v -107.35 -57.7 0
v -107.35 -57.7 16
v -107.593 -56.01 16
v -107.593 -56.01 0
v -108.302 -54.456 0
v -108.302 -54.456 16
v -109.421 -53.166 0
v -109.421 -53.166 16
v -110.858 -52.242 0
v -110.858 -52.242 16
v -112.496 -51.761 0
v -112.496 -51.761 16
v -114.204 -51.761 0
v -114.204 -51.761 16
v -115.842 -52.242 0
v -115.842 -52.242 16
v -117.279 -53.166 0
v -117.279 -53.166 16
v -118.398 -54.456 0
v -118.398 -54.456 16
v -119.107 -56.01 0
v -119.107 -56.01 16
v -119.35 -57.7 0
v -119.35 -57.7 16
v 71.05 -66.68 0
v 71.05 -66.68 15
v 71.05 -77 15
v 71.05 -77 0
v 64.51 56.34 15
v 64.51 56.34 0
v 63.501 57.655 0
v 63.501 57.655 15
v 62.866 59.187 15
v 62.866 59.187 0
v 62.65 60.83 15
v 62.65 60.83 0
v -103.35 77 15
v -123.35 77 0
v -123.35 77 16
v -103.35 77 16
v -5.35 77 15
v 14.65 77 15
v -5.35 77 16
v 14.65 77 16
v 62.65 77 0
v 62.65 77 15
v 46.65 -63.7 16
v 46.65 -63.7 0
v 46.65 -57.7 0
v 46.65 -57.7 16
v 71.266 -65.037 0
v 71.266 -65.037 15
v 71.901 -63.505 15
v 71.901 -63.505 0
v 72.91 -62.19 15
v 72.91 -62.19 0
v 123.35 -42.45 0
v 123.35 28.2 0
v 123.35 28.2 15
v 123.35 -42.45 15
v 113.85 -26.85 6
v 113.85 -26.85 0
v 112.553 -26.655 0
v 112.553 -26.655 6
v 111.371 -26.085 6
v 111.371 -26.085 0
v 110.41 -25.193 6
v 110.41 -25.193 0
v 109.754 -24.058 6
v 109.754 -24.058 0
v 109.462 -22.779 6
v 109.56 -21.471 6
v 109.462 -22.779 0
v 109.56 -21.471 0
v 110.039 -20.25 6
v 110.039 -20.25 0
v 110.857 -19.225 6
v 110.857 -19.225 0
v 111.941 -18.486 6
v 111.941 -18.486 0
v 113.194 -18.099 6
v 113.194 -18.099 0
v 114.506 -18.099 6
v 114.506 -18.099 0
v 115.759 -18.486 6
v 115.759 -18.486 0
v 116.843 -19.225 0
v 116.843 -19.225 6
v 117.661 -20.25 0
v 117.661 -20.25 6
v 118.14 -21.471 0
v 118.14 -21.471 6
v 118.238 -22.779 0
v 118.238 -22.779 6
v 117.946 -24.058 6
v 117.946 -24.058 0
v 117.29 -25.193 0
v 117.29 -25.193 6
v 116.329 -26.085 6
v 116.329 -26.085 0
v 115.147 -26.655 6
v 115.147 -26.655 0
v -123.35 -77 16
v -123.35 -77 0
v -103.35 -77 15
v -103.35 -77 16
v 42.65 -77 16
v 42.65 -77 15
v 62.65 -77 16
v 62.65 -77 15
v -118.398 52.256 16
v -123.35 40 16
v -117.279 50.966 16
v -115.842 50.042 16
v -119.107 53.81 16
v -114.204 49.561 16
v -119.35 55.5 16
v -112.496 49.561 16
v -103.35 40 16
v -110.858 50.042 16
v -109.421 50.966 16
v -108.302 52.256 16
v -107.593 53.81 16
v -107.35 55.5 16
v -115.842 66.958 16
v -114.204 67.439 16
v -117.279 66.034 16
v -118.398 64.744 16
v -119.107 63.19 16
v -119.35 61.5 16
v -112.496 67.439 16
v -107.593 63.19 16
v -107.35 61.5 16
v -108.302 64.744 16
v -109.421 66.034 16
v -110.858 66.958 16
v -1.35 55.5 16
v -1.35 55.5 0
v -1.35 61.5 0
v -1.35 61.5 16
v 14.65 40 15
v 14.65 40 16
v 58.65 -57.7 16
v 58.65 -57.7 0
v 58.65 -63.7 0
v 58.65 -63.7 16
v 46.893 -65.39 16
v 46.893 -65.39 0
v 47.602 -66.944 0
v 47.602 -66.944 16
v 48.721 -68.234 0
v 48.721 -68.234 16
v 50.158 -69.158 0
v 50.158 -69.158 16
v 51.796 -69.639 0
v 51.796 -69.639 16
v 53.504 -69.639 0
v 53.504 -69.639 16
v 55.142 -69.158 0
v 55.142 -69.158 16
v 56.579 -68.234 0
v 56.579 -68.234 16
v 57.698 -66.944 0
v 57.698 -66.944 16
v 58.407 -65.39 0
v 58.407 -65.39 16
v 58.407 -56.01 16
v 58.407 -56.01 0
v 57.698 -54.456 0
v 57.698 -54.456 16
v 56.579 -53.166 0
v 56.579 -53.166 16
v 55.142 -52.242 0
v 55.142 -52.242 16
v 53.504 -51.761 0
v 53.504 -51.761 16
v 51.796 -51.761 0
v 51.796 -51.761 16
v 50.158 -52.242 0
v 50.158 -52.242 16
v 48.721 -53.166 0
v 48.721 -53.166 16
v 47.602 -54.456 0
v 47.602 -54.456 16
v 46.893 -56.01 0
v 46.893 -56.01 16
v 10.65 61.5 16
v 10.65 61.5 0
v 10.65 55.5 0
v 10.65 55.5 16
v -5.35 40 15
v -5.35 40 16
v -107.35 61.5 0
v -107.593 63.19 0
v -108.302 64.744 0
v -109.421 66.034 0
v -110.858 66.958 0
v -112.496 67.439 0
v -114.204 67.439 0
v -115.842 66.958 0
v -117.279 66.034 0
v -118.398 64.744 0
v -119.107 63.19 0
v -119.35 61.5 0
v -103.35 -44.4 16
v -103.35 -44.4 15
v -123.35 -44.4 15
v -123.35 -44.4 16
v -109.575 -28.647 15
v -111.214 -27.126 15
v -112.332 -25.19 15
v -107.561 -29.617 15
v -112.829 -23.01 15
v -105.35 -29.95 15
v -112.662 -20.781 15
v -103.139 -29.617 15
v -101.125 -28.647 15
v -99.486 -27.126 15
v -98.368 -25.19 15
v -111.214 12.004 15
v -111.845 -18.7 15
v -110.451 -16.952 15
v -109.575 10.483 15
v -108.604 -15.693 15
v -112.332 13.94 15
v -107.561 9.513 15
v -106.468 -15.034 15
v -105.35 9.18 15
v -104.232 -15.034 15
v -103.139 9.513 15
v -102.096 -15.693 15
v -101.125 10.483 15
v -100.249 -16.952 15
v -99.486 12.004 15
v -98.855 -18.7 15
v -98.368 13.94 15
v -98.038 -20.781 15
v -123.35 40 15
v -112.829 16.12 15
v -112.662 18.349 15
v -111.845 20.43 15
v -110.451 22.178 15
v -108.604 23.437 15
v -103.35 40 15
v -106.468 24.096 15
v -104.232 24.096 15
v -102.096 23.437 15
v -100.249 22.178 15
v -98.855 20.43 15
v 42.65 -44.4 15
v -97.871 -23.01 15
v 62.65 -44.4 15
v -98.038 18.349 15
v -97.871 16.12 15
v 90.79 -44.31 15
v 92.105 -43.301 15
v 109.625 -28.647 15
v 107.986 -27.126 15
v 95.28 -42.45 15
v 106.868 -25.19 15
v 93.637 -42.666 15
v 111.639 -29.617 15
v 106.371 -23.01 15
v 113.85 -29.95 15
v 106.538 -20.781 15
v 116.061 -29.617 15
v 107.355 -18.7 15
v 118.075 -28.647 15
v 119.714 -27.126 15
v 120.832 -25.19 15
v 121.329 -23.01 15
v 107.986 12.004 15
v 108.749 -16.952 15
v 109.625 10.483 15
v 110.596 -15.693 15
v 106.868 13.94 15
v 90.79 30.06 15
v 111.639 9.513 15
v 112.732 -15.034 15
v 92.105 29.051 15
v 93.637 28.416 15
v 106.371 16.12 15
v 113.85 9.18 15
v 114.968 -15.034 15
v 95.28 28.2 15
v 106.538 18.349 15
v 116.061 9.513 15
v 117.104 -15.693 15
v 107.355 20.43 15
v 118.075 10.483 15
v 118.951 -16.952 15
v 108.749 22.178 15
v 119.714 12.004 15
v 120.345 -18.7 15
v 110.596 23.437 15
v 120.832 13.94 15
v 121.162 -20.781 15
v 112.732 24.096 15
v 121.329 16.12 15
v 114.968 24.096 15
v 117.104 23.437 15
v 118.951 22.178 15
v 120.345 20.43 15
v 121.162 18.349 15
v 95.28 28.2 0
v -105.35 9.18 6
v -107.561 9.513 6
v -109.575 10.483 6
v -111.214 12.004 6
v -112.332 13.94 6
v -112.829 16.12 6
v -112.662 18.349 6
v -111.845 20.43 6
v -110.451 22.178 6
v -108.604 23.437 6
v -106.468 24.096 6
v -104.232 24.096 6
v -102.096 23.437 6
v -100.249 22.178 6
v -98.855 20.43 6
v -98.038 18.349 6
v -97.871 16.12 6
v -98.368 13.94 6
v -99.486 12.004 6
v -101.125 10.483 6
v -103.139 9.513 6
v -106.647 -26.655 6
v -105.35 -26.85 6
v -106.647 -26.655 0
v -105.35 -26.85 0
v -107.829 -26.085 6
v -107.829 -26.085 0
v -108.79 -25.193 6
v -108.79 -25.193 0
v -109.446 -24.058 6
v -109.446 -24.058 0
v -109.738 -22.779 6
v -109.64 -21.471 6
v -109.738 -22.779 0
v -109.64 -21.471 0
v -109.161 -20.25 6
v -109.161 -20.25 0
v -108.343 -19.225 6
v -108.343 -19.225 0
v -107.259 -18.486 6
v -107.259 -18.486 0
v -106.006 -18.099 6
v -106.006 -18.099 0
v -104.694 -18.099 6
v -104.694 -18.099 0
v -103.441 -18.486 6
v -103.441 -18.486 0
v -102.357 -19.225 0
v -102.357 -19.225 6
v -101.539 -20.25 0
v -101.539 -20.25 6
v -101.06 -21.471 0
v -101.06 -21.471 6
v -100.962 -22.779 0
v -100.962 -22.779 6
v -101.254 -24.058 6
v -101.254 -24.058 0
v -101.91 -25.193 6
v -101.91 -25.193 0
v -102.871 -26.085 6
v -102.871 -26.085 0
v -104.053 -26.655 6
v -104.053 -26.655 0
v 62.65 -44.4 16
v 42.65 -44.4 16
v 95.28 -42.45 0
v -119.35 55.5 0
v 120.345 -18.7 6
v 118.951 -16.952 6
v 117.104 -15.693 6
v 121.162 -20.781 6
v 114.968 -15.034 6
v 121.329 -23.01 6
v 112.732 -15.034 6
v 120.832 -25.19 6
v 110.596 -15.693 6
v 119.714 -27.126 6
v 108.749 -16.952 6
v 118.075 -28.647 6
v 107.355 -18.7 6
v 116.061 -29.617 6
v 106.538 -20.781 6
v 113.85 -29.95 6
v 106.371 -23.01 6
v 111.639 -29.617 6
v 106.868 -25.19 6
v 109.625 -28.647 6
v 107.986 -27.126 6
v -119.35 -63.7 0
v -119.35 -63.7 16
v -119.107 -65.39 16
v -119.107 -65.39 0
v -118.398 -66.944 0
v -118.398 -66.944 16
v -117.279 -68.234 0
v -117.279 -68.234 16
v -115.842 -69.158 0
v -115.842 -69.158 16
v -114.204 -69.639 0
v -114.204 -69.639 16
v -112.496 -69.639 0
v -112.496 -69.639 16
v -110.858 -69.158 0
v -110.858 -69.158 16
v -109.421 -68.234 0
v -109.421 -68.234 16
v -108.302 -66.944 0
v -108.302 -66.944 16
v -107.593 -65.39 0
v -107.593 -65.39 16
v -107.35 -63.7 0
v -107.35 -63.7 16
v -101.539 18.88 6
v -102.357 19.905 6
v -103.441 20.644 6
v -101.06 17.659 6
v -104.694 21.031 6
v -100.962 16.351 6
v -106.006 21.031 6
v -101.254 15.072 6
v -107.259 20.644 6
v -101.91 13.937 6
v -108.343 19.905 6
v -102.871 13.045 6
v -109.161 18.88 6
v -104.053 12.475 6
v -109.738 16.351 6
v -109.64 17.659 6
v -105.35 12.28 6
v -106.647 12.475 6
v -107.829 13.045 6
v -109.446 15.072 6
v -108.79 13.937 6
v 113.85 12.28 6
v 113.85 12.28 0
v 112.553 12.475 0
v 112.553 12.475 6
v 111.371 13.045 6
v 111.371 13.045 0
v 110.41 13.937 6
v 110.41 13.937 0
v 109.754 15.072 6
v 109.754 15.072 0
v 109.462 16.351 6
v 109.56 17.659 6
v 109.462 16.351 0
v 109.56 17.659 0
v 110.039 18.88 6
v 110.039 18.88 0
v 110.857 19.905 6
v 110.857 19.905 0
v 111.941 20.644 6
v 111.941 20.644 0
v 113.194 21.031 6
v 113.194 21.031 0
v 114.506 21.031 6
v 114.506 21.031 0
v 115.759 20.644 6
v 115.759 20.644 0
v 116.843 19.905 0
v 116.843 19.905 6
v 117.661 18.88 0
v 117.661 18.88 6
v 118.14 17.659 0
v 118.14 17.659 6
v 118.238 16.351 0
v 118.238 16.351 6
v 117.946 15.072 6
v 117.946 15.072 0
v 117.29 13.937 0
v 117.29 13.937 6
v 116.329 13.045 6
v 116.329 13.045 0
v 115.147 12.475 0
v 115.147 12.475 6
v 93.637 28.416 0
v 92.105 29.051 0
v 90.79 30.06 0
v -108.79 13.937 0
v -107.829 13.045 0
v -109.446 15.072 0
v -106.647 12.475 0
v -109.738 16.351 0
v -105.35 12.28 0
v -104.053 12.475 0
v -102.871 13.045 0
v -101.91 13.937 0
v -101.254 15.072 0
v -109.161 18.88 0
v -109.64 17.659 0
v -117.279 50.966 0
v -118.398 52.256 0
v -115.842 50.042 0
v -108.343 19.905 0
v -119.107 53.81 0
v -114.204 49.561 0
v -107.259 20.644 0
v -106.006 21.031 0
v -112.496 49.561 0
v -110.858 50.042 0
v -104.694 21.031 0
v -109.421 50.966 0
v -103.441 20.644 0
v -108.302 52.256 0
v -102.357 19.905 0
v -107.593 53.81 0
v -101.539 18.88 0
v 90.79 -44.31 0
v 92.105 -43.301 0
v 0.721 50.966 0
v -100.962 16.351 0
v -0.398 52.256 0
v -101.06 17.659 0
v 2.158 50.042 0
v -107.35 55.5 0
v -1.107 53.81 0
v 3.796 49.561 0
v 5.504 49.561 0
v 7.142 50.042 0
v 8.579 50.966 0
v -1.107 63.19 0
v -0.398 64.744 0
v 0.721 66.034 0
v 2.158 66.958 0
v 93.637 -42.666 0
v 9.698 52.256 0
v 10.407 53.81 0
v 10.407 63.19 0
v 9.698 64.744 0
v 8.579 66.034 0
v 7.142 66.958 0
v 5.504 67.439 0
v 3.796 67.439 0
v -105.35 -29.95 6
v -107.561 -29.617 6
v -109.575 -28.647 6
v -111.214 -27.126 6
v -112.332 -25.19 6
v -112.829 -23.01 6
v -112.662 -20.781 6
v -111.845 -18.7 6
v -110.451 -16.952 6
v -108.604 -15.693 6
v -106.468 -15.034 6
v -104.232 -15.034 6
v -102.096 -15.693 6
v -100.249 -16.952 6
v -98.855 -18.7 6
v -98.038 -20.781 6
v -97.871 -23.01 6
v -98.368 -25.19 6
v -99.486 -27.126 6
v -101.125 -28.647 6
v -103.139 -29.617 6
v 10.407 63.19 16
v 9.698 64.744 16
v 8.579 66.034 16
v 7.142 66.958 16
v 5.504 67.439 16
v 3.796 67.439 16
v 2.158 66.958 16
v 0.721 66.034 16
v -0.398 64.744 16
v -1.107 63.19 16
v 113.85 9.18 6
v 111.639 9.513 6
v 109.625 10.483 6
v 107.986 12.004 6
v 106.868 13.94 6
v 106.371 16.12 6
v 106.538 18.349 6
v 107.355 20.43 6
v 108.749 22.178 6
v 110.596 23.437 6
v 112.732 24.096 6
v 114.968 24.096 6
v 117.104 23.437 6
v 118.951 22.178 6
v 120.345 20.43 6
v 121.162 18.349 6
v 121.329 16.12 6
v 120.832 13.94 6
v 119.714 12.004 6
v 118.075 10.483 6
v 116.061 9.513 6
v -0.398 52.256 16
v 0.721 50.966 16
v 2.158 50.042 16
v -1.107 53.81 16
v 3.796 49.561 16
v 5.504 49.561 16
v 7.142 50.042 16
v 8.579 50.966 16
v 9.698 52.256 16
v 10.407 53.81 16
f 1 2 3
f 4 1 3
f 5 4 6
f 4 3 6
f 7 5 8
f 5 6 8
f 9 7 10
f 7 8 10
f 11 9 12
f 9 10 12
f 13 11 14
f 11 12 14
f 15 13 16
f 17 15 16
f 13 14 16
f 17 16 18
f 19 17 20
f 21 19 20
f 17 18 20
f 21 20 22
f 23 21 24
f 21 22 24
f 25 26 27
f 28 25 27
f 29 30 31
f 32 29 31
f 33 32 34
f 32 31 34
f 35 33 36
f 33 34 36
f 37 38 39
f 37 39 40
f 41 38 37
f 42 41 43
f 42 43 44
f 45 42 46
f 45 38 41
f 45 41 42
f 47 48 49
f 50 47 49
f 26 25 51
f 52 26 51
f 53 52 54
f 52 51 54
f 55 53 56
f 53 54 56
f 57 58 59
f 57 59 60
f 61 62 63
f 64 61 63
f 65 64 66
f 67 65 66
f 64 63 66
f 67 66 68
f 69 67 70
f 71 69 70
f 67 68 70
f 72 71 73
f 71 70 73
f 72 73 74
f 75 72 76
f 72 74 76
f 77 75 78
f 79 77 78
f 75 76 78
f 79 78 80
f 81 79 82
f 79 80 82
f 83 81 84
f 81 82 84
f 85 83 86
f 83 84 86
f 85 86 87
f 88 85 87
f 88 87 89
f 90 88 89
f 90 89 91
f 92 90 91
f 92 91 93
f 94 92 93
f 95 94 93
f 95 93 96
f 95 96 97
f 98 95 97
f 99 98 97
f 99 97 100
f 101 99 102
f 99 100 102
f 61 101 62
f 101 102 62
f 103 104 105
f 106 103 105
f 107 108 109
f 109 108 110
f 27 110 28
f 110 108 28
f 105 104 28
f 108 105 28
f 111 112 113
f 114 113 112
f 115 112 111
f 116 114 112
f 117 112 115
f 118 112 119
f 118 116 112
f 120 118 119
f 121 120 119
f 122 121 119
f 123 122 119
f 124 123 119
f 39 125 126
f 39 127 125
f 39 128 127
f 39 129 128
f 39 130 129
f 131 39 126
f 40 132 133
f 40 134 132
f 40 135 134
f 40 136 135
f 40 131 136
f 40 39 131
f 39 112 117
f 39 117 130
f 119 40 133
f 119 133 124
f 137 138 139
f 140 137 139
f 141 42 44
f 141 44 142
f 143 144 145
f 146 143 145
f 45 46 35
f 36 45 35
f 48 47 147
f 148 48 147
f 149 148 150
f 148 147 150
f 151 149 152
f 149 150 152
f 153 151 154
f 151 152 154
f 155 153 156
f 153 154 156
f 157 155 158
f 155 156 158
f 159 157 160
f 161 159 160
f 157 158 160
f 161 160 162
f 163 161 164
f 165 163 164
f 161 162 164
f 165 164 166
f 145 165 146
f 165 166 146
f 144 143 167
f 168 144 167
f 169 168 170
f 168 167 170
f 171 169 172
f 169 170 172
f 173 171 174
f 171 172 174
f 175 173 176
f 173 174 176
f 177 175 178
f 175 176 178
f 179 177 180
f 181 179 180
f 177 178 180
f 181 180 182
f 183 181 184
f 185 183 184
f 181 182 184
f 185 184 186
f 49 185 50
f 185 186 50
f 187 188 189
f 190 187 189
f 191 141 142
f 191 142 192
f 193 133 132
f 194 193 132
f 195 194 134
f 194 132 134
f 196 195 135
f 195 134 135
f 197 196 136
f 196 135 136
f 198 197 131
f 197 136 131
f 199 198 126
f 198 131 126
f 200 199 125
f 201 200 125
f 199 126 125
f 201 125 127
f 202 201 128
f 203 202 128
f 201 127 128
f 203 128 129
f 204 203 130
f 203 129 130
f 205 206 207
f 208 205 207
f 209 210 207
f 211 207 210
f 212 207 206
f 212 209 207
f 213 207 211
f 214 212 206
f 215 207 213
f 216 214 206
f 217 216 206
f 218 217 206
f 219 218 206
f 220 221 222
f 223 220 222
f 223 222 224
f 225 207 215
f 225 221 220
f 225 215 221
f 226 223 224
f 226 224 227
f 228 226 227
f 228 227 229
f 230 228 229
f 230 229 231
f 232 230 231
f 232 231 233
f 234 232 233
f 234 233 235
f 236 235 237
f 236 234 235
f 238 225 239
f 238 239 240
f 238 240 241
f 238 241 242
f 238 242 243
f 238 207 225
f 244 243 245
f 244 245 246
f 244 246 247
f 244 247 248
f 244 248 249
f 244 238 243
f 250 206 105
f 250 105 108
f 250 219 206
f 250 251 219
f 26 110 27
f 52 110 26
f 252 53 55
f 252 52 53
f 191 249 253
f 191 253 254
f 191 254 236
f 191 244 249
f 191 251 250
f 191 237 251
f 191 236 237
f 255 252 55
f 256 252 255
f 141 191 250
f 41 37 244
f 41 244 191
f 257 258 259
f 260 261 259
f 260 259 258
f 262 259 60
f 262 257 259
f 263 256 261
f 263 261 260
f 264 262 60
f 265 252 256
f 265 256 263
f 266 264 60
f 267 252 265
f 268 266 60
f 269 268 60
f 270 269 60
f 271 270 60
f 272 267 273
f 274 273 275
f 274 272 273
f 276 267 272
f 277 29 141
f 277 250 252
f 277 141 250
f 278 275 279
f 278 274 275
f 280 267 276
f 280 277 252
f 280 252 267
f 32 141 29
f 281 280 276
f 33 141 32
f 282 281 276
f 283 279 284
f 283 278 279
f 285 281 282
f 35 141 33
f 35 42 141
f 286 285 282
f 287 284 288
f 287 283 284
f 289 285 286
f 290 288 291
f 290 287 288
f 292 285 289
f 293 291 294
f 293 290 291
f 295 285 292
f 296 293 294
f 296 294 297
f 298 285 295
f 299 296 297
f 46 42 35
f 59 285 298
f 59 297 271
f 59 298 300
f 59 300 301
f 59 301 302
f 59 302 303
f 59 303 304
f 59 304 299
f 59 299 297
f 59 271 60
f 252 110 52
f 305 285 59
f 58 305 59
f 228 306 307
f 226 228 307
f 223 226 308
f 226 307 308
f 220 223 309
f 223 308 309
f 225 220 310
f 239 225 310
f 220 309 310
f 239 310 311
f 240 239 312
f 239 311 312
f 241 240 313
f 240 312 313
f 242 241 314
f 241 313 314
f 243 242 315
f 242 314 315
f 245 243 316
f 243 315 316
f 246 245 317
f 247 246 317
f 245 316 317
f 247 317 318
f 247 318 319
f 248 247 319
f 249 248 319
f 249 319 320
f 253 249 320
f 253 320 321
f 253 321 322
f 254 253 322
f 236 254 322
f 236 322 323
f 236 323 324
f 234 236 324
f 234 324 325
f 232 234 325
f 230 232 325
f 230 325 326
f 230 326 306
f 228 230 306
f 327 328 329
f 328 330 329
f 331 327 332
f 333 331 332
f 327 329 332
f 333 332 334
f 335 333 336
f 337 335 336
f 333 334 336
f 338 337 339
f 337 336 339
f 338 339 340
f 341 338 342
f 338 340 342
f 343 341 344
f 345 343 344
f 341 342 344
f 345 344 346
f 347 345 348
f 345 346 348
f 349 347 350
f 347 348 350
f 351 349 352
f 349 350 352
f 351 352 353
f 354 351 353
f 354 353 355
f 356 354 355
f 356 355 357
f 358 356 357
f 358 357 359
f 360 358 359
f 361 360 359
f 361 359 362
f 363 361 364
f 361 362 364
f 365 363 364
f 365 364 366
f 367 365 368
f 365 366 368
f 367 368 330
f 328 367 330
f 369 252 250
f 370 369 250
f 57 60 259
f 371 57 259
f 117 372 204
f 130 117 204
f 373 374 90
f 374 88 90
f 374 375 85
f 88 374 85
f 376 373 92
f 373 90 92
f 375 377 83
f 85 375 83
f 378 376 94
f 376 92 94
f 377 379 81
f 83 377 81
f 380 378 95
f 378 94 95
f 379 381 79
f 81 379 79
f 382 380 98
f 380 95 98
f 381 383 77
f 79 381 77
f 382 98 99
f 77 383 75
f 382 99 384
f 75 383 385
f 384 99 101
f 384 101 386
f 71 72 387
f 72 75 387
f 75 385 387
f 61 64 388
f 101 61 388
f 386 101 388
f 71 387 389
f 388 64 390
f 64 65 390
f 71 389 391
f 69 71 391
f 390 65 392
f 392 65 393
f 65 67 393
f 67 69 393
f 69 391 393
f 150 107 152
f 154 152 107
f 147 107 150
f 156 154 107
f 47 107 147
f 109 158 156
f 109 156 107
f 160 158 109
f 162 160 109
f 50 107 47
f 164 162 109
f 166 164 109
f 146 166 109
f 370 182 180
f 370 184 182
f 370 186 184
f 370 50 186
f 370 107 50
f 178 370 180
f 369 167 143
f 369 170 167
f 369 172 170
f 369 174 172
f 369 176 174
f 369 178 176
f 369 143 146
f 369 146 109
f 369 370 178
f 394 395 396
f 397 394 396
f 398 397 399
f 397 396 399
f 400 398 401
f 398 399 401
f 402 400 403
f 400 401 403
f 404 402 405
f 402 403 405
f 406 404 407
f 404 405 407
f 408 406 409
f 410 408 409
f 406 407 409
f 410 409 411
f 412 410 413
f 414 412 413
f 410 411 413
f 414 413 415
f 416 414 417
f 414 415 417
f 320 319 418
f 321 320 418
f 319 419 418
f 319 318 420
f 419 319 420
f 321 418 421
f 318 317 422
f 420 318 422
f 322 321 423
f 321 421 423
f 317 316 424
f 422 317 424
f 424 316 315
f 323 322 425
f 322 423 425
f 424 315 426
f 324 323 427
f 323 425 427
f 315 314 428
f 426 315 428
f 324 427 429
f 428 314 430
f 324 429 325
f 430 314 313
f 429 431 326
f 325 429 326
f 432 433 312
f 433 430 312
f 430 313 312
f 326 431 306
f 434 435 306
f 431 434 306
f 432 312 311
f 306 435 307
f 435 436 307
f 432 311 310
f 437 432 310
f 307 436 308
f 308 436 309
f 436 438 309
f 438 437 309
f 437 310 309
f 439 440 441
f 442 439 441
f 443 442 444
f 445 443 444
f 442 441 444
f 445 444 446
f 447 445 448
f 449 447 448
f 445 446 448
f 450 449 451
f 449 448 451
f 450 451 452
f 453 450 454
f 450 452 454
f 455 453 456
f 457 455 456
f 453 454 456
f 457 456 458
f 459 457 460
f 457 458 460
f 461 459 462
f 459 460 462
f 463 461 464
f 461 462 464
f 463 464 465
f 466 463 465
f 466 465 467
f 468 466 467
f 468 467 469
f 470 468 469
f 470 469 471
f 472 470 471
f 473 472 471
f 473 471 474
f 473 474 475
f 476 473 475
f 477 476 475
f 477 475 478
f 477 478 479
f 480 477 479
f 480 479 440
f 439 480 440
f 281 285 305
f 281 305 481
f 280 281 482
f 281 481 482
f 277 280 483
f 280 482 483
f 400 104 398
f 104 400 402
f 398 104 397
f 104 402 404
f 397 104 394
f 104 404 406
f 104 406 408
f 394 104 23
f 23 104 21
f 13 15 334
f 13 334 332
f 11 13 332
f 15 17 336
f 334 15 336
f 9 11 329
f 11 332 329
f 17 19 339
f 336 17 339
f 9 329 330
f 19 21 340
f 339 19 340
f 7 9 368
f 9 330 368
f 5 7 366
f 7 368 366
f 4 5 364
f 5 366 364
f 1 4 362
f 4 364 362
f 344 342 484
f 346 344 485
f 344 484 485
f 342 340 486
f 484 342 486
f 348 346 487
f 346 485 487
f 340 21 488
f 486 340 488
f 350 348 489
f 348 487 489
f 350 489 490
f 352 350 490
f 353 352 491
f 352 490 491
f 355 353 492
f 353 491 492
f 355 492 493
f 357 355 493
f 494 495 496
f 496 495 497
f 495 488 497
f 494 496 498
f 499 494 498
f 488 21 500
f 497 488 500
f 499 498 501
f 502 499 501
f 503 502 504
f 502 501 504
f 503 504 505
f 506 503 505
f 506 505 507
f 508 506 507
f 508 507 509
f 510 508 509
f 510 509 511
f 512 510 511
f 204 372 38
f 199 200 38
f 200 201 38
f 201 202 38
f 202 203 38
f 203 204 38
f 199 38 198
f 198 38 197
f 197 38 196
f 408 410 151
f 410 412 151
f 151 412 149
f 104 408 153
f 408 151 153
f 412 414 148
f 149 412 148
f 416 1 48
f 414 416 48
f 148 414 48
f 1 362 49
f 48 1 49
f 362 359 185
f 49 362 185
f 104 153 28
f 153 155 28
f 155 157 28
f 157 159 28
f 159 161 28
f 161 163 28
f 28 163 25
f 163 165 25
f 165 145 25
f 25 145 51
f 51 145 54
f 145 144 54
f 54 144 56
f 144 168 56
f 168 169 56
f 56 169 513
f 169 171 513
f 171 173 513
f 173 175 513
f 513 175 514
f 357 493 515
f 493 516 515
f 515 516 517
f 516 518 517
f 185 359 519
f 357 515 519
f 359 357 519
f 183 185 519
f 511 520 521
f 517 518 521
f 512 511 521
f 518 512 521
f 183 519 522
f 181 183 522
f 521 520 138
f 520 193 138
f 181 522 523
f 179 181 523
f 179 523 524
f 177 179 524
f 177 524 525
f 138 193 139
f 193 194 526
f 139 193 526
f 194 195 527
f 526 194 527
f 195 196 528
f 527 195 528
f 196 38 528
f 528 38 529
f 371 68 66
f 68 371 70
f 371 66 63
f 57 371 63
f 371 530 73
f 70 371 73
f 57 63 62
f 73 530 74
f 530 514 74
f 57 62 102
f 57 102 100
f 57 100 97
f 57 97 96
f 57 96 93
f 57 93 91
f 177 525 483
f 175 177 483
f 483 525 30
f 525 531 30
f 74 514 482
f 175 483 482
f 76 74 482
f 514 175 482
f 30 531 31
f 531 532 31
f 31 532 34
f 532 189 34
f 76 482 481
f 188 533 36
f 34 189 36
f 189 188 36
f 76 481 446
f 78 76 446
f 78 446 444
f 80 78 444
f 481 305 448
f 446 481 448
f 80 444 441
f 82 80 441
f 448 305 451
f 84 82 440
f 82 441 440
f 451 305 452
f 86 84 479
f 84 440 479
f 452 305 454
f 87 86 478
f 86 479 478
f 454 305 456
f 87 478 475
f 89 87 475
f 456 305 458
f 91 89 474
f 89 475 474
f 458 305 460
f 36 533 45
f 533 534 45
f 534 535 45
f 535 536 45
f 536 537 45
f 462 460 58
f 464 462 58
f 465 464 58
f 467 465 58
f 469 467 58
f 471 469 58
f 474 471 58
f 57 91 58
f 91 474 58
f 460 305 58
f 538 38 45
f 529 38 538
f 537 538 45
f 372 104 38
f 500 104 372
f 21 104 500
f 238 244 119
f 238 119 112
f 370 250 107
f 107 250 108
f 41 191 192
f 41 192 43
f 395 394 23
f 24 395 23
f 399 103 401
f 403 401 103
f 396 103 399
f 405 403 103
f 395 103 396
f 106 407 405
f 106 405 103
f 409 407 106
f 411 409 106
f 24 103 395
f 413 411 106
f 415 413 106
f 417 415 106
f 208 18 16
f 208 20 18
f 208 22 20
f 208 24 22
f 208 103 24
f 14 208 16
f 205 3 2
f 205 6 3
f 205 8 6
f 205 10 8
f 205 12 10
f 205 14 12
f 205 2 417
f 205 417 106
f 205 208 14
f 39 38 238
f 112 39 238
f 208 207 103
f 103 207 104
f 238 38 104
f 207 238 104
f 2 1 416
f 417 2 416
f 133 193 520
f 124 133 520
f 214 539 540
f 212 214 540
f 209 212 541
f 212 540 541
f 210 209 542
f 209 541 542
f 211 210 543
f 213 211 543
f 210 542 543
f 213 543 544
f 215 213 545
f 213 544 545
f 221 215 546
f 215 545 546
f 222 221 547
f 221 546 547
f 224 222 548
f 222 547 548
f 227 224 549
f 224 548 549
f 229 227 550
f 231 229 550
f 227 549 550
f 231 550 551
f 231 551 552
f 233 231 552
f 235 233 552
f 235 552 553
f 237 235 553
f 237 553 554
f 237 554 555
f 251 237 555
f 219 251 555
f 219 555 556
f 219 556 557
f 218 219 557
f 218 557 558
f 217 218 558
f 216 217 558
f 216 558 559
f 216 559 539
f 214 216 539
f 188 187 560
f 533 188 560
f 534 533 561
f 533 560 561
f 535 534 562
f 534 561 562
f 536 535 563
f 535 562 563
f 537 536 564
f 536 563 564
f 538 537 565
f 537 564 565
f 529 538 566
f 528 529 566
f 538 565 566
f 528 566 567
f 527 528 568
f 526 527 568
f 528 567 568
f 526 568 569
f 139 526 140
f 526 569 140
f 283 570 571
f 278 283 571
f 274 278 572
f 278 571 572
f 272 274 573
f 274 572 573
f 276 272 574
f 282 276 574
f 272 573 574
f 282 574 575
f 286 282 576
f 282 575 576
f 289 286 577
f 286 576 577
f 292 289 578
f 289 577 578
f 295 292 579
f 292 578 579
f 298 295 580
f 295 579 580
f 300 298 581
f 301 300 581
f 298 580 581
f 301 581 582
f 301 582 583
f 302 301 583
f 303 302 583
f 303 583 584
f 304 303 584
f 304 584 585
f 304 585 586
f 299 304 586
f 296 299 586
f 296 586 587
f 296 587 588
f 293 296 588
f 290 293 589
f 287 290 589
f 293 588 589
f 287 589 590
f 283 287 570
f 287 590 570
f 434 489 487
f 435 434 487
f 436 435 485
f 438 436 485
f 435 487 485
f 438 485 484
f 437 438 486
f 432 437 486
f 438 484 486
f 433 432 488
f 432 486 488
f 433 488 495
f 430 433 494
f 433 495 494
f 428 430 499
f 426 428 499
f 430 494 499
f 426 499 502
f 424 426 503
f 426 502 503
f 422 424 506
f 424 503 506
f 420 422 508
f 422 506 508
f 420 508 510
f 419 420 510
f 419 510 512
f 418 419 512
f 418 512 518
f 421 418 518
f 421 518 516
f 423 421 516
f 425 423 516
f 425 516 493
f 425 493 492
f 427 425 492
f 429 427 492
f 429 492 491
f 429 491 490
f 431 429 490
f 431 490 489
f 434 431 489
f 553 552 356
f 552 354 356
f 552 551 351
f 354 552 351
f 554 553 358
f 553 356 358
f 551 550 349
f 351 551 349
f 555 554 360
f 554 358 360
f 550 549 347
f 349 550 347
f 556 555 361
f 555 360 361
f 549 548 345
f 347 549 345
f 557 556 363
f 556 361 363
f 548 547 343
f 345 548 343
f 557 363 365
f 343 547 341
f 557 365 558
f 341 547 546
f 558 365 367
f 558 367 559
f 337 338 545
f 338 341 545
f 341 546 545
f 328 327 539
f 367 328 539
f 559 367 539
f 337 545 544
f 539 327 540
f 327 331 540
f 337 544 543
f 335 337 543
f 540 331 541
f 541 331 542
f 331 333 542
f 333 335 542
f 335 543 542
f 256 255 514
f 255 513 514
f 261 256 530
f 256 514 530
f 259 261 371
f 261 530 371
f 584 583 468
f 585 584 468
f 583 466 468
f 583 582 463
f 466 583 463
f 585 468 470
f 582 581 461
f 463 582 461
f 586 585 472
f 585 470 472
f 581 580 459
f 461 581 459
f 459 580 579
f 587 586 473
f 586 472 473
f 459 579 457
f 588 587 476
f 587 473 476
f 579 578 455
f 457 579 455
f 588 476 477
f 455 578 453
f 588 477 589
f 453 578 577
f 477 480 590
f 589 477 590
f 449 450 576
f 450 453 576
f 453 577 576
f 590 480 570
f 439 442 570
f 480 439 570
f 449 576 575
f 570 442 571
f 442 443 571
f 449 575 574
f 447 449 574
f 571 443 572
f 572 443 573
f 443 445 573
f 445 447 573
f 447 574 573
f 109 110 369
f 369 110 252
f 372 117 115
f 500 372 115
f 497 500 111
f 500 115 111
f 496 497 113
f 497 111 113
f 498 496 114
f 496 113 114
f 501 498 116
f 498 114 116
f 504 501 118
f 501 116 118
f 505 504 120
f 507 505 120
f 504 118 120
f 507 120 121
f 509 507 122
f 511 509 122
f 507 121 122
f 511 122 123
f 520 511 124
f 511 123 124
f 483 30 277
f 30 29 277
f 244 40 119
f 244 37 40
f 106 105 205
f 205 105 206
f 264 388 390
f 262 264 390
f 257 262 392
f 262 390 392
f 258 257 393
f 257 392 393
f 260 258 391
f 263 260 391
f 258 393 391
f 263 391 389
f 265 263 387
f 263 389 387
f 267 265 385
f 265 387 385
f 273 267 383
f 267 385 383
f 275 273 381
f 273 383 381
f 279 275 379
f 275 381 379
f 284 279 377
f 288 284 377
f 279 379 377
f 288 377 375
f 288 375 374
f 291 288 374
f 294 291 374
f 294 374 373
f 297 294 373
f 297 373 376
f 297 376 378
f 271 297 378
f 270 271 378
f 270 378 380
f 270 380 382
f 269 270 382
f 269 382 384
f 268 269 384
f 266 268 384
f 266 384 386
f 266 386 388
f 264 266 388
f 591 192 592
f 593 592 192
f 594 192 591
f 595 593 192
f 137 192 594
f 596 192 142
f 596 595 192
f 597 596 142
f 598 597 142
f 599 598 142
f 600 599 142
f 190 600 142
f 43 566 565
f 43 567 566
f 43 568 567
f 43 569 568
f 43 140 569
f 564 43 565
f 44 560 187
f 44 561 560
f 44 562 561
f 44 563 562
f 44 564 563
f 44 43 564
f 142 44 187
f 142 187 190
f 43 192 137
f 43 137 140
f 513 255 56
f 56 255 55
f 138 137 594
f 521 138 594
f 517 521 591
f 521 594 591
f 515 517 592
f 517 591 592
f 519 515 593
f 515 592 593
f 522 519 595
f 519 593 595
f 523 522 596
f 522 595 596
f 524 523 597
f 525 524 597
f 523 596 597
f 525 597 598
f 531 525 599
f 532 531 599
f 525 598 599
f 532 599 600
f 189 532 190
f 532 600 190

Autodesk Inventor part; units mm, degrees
ref_plane "YZ Plane" through (0, 0, 0) normal (1, 0, 0) x (0, 1, 0)
ref_plane "XZ Plane" through (0, 0, 0) normal (0, 1, 0) x (-1, 0, 0)
ref_plane "XY Plane" through (0, 0, 0) normal (0, 0, 1) x (1, 0, 0)
sketch "Sketch1" plane through (0, 0, 0) normal (0, 0, 1) x (1, 0, 0)
  line L0 (-123.35, 77) -> (123.35, 77)
  line L1 (123.35, 77) -> (123.35, -77)
  line L2 (123.35, -77) -> (-123.35, -77)
  line L3 (-123.35, -77) -> (-123.35, 77)
  point P0 (0, 0)
  point P1 (-123.35, 0)
  point P2 (0, 77)
  dimension "d0" = 246.7
  dimension "d1" = 154
extrude "Extrusion1" add sketch "Sketch1" along normal blind 15
sketch "Sketch2" plane through (0, 0, 15) normal (0, 0, 1) x (1, 0, 0)
  line L0 (-123.35, 77) -> (123.35, 77) projected
  line L1 (123.35, 77) -> (123.35, -77) projected
  line L2 (62.65, 77) -> (62.65, 28.2)
  line L3 (62.65, 28.2) -> (123.35, 28.2)
  line L4 (123.35, -77) -> (-123.35, -77) projected
  line L5 (62.65, 58.2) -> (92.65, 28.2)
  dimension "d4" = 60.7
  dimension "d5" = 105.2
  dimension "d6" = 45
  dimension "d7" = 30.7
extrude "Extrusion2" cut sketch "Sketch2" against normal through all contours L0 L1 L3 L5 L2
sketch "Sketch3" plane through (0, 0, 15) normal (0, 0, 1) x (1, 0, 0)
  line L0 (123.35, 28.2) -> (123.35, -77) projected
  line L1 (123.35, -42.45) -> (92.65, -42.45)
  line L2 (92.65, -42.45) -> (71.05, -64.05)
  line L3 (71.05, -64.05) -> (71.05, -77)
  line L4 (123.35, -77) -> (-123.35, -77) projected
  point P0 (92.65, 28.2)
  point P1 (62.65, 58.2)
  dimension "d10" = 34.55
  dimension "d11" = 45
  dimension "d41" = 52.3
extrude "Extrusion3" cut sketch "Sketch3" against normal through all
fillet "Fillet1" radius 6.35 4 edges at (62.65, 58.2, 7.5) (92.65, 28.2, 7.5) (92.65, -42.45, 7.5) (71.05, -64.05, 7.5)
sketch "Sketch4" plane through (0, 0, 15) normal (0, 0, 1) x (1, 0, 0)
  line L0 (-123.35, 77) -> (-103.35, 77)
  line L1 (-103.35, 77) -> (-103.35, 40)
  line L2 (-103.35, 40) -> (-123.35, 40)
  line L3 (-123.35, 40) -> (-123.35, 77)
  dimension "d15" = 37
  dimension "d16" = 20
extrude "Extrusion4" add sketch "Sketch4" along normal blind 1
sketch "Sketch5" plane through (0, 0, 16) normal (0, 0, 1) x (1, 0, 0)
  line L0 (-119.35, 55.5) -> (-119.35, 61.5)
  arc A0 (-107.35, 61.5) -> (-119.35, 61.5) centre (-113.35, 61.5) ccw
  line L1 (-107.35, 61.5) -> (-107.35, 55.5)
  arc A1 (-119.35, 55.5) -> (-107.35, 55.5) centre (-113.35, 55.5) ccw
  line L2 (-119.35, 58.5) -> (-107.35, 58.5) construction
  line L3 (-103.35, 77) -> (-103.35, 40) construction
  line L4 (-103.35, 40) -> (-123.35, 40) construction
  point P0 (-103.35, 58.5)
  point P1 (-113.35, 40)
  point P2 (-113.35, 58.5)
  dimension "d23" = 12
  dimension "d24" = 18
extrude "Extrusion5" cut sketch "Sketch5" against normal through all
pattern_linear "Rectangular Pattern1" count 2 spacing 118 along (1, 0, 0) of "Extrusion4", "Extrusion5"
sketch "Sketch6" plane through (0, 0, 15) normal (0, 0, 1) x (1, 0, 0)
  line L0 (-123.35, -77) -> (-103.35, -77)
  line L1 (-103.35, -77) -> (-103.35, -44.4)
  line L2 (-103.35, -44.4) -> (-123.35, -44.4)
  line L3 (-123.35, -44.4) -> (-123.35, -77)
  point P0 (-103.35, 40)
  dimension "d30" = 32.6
extrude "Extrusion6" add sketch "Sketch6" along normal blind 1
sketch "Sketch7" plane through (0, -119.2, 16) normal (0, 0, 1) x (1, 0, 0)
  line L0 (-119.35, 55.5) -> (-119.35, 61.5)
  arc A0 (-107.35, 61.5) -> (-119.35, 61.5) centre (-113.35, 61.5) ccw
  line L1 (-107.35, 61.5) -> (-107.35, 55.5)
  arc A1 (-119.35, 55.5) -> (-107.35, 55.5) centre (-113.35, 55.5) ccw
  line L2 (-119.35, 58.5) -> (-107.35, 58.5) construction
  line L3 (-103.35, 77) -> (-103.35, 40) construction
  line L4 (-103.35, 40) -> (-123.35, 40) construction
  point P0 (-103.35, 58.5)
  point P1 (-113.35, 40)
  point P2 (-113.35, 58.5)
  dimension "d34" = 12
  dimension "d33" = 18
extrude "Extrusion7" cut sketch "Sketch7" against normal through all
pattern_linear "Rectangular Pattern2" count 2 spacing 166 along (1, 0, 0) of "Extrusion7", "Extrusion6"
hole "Hole1" at (-105.35, -22.45, 15) direction (0, 0, -1) diameter 8.8 end through all counterbore diameter 15 counterbore depth 9
pattern_linear "Rectangular Pattern3" count 2 spacing 39.13 along (0, 1, 0) count 2 spacing 219.2 along (1, 0, 0) of "Hole1"
properties part number "VERTICAL PLATE" material "Steel, Mild"
